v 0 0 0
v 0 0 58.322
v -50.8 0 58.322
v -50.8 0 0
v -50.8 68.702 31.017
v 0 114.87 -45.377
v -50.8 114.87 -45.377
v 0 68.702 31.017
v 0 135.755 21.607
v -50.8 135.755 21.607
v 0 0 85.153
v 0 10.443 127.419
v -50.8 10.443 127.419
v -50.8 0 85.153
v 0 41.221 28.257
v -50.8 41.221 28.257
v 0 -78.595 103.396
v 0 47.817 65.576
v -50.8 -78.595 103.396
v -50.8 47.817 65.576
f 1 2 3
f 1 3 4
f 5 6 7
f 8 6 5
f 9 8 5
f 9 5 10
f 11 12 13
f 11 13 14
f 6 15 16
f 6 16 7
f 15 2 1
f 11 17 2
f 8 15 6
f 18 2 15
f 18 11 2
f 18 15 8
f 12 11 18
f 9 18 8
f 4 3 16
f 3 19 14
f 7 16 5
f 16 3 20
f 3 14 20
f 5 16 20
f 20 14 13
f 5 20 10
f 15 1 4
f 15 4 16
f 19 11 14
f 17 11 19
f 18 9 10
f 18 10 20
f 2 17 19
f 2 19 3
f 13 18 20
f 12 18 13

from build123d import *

# Parameters (mm, degrees)
F1_DEPTH = 50.8


with BuildPart() as f1:
    # F0 (on Right) → F1 (new body)
    with BuildSketch(Plane.YZ):
        Polygon((0, 58.321822), (0, 0), (41.221242, 28.256854), (114.869855, -45.376718), (68.702079, 31.017145), (135.755301, 21.60695), (47.816634, 65.576285), (10.442711, 127.418935), (0, 85.152954), (-78.595169, 103.396483), align=None)
    extrude(amount=-F1_DEPTH)


solid = f1.part
